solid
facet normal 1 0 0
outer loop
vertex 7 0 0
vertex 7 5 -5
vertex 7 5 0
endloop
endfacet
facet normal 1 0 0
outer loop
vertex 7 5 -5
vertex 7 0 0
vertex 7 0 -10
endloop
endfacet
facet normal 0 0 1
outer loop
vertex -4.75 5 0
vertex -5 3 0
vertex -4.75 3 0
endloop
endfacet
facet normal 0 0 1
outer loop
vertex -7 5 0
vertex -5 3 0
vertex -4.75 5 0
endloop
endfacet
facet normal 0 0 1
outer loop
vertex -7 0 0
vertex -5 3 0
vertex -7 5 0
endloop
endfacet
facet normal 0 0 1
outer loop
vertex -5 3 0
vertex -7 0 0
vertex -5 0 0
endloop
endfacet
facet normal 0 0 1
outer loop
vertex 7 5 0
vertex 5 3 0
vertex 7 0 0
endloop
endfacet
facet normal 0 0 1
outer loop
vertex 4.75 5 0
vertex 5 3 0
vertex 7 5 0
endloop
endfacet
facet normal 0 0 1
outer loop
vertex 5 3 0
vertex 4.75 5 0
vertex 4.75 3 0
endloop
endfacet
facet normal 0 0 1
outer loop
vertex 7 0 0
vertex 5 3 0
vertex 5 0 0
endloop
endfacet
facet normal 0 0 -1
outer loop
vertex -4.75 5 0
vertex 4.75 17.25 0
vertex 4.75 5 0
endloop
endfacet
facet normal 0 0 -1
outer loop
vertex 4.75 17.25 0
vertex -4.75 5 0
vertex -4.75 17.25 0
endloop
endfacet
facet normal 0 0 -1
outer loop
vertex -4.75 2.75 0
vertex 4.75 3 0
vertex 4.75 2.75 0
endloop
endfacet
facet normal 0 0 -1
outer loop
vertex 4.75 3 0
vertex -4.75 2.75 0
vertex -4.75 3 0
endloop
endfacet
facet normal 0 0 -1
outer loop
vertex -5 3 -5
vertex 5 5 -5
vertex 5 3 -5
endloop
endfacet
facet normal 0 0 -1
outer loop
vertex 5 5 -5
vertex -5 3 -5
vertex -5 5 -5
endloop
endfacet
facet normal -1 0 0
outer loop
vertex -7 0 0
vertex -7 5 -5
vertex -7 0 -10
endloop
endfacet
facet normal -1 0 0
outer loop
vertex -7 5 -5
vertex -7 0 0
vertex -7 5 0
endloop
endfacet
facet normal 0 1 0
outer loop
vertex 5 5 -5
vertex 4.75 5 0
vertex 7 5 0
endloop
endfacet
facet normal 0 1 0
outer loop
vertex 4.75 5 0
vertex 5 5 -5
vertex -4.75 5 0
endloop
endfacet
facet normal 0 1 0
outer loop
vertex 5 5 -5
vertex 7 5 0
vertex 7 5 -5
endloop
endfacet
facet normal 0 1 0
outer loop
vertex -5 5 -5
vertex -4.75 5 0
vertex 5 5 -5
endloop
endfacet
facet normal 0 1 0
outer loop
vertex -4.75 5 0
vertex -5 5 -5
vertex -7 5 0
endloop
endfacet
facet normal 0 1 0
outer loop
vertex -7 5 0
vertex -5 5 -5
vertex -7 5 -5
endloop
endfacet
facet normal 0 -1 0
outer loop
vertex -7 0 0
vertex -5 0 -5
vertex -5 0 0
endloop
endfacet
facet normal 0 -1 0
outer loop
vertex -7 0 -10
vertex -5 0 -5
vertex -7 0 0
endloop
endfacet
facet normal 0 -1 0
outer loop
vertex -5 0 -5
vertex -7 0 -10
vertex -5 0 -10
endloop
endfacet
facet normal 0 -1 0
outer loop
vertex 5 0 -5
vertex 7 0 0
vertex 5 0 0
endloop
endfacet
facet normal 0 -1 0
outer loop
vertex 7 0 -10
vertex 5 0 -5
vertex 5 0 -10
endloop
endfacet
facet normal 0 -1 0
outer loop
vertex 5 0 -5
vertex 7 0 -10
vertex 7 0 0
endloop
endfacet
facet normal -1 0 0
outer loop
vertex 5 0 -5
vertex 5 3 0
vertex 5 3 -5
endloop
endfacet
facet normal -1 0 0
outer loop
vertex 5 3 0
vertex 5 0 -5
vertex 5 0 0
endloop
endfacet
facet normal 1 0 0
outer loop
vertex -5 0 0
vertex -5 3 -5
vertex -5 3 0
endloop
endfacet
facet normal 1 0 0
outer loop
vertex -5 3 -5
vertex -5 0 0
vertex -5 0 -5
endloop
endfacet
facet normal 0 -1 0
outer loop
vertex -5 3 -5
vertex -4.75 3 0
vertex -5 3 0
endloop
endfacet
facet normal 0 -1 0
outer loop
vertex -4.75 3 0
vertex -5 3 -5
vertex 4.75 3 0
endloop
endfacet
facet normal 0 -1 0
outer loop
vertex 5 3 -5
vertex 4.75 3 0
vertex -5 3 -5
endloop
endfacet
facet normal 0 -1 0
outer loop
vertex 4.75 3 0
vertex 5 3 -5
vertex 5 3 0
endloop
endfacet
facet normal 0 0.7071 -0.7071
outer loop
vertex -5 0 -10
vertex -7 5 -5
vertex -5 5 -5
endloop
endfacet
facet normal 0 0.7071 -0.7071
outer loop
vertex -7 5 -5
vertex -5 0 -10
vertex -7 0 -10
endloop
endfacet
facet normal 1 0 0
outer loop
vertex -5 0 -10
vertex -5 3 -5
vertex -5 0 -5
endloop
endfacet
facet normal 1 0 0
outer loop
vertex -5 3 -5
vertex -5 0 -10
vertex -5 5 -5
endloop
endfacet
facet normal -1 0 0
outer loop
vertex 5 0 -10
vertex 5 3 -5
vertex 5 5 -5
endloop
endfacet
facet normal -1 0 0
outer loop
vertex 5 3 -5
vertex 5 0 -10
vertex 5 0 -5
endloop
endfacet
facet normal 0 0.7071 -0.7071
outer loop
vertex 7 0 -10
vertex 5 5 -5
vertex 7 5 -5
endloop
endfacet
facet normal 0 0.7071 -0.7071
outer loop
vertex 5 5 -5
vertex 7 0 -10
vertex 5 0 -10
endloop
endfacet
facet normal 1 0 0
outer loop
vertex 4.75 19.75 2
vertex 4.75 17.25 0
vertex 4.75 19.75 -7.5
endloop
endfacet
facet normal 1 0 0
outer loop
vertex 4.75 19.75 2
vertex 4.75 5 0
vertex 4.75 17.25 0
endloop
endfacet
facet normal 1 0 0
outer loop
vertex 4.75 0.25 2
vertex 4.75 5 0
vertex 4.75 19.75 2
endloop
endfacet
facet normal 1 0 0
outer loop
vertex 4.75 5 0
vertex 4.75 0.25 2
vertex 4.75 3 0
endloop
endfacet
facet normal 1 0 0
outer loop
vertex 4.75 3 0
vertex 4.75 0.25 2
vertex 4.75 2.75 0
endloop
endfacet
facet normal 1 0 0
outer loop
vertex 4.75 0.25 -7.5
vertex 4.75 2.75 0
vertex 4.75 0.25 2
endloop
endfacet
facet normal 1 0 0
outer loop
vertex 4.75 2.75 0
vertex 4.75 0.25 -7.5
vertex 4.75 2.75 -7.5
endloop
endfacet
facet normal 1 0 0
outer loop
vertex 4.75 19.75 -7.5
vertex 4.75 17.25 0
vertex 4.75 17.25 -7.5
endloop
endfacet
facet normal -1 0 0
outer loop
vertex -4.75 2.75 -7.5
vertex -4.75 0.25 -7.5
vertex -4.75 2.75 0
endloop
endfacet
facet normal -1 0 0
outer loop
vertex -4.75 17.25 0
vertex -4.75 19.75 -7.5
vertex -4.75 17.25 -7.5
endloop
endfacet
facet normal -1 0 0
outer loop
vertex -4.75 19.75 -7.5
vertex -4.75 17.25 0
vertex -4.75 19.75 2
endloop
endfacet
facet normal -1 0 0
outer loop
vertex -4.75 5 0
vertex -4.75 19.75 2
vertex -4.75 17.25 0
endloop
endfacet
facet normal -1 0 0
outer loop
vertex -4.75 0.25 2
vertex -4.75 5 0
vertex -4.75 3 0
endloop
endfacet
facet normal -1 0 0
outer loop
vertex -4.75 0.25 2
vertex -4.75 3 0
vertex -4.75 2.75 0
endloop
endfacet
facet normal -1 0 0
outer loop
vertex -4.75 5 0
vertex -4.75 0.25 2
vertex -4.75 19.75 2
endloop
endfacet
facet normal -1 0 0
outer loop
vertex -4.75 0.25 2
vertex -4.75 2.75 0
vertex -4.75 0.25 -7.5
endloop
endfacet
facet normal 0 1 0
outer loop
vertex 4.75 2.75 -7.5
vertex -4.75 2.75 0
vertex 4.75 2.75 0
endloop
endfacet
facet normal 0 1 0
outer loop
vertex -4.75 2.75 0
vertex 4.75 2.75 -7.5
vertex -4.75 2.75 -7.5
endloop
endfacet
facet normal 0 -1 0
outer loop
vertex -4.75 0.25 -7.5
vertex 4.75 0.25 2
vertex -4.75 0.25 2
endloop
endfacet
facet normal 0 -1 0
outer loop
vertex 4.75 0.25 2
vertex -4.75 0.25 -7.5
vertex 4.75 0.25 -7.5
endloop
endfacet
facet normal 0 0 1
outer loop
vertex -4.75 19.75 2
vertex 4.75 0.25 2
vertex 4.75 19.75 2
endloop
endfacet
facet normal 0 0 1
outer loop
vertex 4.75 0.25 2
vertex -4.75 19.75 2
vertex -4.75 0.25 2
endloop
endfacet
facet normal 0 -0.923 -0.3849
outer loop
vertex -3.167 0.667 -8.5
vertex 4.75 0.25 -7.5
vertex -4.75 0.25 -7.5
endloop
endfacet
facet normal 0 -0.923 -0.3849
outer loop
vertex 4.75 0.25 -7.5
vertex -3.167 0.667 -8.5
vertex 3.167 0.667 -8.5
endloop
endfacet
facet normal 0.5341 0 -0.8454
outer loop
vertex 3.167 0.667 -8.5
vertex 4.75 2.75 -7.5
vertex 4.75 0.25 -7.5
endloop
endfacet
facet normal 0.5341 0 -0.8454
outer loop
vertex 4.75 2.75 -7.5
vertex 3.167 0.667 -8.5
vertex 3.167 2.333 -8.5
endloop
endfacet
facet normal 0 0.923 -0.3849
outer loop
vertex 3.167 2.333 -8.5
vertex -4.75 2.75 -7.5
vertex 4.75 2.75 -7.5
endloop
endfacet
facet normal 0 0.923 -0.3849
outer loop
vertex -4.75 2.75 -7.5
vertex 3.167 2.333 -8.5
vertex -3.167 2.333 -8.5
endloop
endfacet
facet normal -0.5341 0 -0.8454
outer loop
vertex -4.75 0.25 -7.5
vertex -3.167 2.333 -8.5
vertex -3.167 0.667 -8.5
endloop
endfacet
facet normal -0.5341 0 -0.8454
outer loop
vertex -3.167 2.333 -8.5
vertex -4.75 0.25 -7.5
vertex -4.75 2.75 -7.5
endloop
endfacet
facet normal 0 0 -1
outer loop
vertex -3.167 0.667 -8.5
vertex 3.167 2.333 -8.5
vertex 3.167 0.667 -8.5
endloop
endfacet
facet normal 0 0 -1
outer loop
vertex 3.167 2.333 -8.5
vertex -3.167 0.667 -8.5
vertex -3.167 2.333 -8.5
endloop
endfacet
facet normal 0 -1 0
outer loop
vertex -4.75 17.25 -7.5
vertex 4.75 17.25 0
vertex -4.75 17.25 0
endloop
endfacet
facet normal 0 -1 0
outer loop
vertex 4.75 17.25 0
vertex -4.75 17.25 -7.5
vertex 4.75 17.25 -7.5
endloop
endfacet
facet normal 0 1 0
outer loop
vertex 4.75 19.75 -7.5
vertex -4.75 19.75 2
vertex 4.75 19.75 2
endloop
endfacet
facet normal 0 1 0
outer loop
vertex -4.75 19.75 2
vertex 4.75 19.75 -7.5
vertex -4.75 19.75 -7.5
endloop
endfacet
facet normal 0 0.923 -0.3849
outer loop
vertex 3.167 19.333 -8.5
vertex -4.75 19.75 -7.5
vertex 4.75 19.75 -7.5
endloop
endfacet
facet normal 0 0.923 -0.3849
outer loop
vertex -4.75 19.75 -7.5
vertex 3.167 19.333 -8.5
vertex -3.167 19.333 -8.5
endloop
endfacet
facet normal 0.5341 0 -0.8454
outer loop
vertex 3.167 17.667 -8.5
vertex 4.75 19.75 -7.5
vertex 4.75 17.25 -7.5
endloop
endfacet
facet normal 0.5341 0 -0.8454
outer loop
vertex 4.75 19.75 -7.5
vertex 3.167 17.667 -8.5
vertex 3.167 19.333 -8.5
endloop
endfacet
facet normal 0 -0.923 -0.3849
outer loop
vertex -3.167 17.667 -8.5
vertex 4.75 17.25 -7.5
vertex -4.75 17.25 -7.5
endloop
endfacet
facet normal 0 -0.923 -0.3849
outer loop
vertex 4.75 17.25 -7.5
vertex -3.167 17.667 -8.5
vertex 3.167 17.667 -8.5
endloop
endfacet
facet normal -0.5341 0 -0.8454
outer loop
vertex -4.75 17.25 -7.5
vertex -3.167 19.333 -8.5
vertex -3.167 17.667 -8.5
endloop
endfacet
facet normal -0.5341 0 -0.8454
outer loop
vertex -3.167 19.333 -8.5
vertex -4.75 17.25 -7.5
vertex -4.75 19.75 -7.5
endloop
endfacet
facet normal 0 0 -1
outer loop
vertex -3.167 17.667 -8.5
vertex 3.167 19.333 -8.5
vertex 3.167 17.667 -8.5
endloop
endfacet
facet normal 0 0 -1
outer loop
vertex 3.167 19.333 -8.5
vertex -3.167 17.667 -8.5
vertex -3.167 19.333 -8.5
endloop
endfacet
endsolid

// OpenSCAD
iw = 10;  // inner width
it = 3;   // inner thickness
h = 5;    // height
wt = 2;   // wall thickness
m = 0.25; // margin

module addon_holder() {
    module reinforcement() {
        rotate(90, [0, 0, 1])
        rotate(90, [1, 0, 0])
        linear_extrude(height=wt)
        polygon([
            [0, 0],
            [it+wt, 0],
            [0, -h]
        ]);
    }
    
    color("yellow") translate([-wt-iw/2, 0, -h]) {
        difference() {
            cube([iw+2*wt, it+wt, h]);
            translate([wt, -1, -1]) cube([iw, it+1, h+2]);
        }
        reinforcement();
        translate([iw+wt, 0, 0]) reinforcement();
    }
}

module addon_clip() {
    ch = 1.5*h;
    
    color("#fcc705") {
        translate([-(iw-2*m)/2, m, -ch])
        cube([iw-2*m, it-2*m, ch]);
        
        translate([-(iw-2*m)/2, m, 0])
        cube([iw-2*m, it+wt-m, wt]);
    
        translate([0, (it-2*m)/2+m, -ch-1])
        resize([iw-2*m, it-2*m, 1])
        rotate(45, [0, 0, 1])
        cylinder(h=1, r1=it/3, r2=it/2, $fn=4);
    }
}

module addon_bar(width) {
    addon_clip();
    translate([0, width, 0]) mirror([0, 1, 0]) addon_clip();
    
    color("orange")
    translate([-(iw-2*m)/2, it+wt, 0])
    cube([iw-2*m, width-2*(it+wt), wt]);
}

addon_holder();
addon_bar(20);
